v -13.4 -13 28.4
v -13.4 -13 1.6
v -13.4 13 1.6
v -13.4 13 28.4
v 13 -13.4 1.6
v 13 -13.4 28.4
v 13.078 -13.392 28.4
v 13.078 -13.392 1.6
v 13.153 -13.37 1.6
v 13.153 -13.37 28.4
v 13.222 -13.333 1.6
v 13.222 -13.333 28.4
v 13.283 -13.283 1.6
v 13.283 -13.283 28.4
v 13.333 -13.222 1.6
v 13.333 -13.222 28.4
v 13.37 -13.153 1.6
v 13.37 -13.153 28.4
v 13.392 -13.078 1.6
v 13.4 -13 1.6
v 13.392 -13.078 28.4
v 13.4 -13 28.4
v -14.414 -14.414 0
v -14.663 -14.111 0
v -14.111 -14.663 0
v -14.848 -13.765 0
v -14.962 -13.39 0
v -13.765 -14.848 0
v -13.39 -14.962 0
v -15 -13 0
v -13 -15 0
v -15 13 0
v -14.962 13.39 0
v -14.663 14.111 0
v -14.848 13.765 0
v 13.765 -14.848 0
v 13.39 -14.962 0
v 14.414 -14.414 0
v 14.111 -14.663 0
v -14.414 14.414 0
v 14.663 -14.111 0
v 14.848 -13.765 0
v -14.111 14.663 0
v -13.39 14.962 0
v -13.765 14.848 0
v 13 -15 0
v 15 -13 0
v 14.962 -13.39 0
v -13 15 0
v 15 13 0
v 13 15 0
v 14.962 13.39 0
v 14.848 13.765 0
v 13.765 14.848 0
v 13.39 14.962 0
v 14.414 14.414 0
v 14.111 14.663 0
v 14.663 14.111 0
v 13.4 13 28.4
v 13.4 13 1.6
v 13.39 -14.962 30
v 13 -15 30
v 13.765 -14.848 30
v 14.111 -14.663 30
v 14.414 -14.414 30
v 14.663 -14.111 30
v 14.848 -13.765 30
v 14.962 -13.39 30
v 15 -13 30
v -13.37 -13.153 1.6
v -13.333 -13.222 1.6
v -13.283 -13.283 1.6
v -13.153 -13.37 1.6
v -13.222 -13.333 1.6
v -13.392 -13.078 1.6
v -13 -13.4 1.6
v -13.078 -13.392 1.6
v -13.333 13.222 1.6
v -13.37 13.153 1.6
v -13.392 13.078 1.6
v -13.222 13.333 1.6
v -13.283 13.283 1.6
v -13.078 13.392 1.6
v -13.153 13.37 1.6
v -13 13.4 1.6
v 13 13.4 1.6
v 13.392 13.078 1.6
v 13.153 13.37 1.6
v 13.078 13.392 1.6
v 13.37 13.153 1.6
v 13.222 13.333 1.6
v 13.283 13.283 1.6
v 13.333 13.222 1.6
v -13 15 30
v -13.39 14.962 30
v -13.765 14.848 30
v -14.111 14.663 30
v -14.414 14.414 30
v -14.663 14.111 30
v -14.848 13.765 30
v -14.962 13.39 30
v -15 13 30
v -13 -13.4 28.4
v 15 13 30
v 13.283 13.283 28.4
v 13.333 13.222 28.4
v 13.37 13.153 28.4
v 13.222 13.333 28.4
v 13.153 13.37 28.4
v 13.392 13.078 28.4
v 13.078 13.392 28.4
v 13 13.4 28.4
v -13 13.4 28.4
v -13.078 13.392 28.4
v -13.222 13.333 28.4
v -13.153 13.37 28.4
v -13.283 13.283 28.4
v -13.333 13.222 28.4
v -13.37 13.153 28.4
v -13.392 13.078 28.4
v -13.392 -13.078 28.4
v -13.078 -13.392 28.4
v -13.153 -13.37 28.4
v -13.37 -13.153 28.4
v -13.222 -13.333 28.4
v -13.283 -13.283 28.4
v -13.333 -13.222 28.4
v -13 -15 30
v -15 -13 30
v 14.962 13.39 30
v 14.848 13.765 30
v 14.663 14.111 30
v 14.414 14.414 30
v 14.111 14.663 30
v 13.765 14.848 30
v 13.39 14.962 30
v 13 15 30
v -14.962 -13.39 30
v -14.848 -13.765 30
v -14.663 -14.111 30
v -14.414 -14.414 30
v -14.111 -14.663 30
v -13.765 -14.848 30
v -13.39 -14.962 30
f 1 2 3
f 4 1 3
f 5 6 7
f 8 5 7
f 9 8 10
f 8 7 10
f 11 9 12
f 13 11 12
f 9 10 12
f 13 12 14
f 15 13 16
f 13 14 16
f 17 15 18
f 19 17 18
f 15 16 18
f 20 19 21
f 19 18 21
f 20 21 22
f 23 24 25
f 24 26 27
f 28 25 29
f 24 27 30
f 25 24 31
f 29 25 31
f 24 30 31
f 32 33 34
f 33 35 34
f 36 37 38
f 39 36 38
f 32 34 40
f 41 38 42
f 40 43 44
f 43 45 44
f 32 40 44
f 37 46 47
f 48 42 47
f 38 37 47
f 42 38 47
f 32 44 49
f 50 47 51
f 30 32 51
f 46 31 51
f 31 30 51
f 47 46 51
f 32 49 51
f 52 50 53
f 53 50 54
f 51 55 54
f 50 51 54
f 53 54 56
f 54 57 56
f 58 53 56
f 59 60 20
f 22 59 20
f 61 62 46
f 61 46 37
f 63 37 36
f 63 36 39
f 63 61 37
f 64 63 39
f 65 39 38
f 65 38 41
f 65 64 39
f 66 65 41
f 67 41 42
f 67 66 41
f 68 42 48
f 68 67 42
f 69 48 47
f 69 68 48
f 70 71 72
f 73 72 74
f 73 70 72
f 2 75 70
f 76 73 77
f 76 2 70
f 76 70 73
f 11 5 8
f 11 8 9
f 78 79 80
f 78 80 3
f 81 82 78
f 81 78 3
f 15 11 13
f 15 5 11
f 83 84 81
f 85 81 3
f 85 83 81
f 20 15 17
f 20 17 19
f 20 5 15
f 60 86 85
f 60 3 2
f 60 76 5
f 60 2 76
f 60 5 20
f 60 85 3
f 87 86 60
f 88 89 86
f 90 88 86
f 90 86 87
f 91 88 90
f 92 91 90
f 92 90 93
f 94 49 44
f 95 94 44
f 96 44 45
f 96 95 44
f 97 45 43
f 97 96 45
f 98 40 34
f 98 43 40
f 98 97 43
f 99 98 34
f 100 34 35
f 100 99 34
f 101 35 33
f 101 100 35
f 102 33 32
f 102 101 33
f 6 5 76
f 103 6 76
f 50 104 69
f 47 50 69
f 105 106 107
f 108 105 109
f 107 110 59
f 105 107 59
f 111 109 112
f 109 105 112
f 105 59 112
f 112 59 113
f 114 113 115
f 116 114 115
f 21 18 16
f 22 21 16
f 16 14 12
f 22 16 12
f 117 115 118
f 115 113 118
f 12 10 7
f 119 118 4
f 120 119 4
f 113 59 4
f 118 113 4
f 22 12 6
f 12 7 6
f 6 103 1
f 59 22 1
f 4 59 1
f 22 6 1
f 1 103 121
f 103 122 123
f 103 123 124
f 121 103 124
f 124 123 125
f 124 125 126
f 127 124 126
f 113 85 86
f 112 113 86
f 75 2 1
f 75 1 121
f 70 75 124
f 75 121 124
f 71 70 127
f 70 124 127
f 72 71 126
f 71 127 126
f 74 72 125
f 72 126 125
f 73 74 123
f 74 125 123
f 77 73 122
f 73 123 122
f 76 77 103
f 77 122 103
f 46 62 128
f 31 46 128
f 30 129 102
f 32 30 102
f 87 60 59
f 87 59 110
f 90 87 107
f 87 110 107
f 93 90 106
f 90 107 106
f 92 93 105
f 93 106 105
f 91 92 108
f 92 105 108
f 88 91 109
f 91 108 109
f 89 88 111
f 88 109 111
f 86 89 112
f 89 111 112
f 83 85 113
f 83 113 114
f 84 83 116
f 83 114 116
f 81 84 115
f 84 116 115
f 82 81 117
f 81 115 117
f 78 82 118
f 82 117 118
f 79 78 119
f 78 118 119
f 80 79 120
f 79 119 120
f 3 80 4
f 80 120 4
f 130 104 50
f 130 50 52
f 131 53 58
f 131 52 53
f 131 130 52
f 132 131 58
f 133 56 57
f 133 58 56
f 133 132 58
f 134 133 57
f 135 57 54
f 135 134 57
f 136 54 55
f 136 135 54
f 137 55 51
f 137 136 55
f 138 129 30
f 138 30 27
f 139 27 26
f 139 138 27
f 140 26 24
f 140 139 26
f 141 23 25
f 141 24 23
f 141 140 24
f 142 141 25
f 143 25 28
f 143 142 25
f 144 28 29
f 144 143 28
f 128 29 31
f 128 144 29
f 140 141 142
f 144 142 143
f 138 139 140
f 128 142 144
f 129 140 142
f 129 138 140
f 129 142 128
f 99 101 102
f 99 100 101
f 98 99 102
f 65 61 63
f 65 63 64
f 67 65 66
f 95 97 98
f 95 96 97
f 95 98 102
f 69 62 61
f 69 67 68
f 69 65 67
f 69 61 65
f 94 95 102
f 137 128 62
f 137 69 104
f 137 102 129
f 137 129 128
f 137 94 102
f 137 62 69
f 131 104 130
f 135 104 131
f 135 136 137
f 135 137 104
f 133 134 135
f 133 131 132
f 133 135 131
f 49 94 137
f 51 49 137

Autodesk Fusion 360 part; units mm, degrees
sketch "Sketch1" plane through (0, 0, 0) normal (0, 0, 1) x (1, 0, 0)
  line L0 (15, -15) -> (-15, -15)
  line L1 (-15, -15) -> (-15, 15)
  line L2 (-15, 15) -> (15, 15)
  line L3 (15, 15) -> (15, -15)
  line L4 (15, -15) -> (-15, 15) construction
  line L5 (-15, -15) -> (15, 15) construction
  dimension "d1" = 30
  dimension "d2" = 30
extrude "Extrude1" add sketch "Sketch1" along normal blind 30
fillet "Fillet1" radius 2 4 edges at (-15, -15, 15) (15, -15, 15) (15, 15, 15) (-15, 15, 15)
shell "Shell1" thickness 1.6 removed faces 1 at (4.3333, -5, 30)
sketch "Sketch2" plane through (0, 0, 30) normal (0, 0, 1) x (-1, 0, 0)
  arc A0 (-13.4, -13) -> (-13, -13.4) centre (-13, -13) ccw
  line L0 (-13.4, -13) -> (-13.4, 13)
  arc A1 (-13, 13.4) -> (-13.4, 13) centre (-13, 13) ccw
  line L1 (-13, 13.4) -> (13, 13.4)
  arc A2 (13.4, 13) -> (13, 13.4) centre (13, 13) ccw
  line L2 (13.4, 13) -> (13.4, -13)
  arc A3 (13, -13.4) -> (13.4, -13) centre (13, -13) ccw
  line L3 (13, -13.4) -> (-13, -13.4)
  arc A4 (13, -15) -> (15, -13) centre (13, -13) ccw
  line L4 (15, -13) -> (15, 13)
  arc A5 (15, 13) -> (13, 15) centre (13, 13) ccw
  line L5 (13, 15) -> (-13, 15)
  arc A6 (-13, 15) -> (-15, 13) centre (-13, 13) ccw
  line L6 (-15, 13) -> (-15, -13)
  arc A7 (-15, -13) -> (-13, -15) centre (-13, -13) ccw
  line L7 (-13, -15) -> (13, -15)
extrude "Extrude2" add sketch "Sketch2" against normal blind 1.6 contours A0 L0 A1 L1 A2 L2 A3 L3
